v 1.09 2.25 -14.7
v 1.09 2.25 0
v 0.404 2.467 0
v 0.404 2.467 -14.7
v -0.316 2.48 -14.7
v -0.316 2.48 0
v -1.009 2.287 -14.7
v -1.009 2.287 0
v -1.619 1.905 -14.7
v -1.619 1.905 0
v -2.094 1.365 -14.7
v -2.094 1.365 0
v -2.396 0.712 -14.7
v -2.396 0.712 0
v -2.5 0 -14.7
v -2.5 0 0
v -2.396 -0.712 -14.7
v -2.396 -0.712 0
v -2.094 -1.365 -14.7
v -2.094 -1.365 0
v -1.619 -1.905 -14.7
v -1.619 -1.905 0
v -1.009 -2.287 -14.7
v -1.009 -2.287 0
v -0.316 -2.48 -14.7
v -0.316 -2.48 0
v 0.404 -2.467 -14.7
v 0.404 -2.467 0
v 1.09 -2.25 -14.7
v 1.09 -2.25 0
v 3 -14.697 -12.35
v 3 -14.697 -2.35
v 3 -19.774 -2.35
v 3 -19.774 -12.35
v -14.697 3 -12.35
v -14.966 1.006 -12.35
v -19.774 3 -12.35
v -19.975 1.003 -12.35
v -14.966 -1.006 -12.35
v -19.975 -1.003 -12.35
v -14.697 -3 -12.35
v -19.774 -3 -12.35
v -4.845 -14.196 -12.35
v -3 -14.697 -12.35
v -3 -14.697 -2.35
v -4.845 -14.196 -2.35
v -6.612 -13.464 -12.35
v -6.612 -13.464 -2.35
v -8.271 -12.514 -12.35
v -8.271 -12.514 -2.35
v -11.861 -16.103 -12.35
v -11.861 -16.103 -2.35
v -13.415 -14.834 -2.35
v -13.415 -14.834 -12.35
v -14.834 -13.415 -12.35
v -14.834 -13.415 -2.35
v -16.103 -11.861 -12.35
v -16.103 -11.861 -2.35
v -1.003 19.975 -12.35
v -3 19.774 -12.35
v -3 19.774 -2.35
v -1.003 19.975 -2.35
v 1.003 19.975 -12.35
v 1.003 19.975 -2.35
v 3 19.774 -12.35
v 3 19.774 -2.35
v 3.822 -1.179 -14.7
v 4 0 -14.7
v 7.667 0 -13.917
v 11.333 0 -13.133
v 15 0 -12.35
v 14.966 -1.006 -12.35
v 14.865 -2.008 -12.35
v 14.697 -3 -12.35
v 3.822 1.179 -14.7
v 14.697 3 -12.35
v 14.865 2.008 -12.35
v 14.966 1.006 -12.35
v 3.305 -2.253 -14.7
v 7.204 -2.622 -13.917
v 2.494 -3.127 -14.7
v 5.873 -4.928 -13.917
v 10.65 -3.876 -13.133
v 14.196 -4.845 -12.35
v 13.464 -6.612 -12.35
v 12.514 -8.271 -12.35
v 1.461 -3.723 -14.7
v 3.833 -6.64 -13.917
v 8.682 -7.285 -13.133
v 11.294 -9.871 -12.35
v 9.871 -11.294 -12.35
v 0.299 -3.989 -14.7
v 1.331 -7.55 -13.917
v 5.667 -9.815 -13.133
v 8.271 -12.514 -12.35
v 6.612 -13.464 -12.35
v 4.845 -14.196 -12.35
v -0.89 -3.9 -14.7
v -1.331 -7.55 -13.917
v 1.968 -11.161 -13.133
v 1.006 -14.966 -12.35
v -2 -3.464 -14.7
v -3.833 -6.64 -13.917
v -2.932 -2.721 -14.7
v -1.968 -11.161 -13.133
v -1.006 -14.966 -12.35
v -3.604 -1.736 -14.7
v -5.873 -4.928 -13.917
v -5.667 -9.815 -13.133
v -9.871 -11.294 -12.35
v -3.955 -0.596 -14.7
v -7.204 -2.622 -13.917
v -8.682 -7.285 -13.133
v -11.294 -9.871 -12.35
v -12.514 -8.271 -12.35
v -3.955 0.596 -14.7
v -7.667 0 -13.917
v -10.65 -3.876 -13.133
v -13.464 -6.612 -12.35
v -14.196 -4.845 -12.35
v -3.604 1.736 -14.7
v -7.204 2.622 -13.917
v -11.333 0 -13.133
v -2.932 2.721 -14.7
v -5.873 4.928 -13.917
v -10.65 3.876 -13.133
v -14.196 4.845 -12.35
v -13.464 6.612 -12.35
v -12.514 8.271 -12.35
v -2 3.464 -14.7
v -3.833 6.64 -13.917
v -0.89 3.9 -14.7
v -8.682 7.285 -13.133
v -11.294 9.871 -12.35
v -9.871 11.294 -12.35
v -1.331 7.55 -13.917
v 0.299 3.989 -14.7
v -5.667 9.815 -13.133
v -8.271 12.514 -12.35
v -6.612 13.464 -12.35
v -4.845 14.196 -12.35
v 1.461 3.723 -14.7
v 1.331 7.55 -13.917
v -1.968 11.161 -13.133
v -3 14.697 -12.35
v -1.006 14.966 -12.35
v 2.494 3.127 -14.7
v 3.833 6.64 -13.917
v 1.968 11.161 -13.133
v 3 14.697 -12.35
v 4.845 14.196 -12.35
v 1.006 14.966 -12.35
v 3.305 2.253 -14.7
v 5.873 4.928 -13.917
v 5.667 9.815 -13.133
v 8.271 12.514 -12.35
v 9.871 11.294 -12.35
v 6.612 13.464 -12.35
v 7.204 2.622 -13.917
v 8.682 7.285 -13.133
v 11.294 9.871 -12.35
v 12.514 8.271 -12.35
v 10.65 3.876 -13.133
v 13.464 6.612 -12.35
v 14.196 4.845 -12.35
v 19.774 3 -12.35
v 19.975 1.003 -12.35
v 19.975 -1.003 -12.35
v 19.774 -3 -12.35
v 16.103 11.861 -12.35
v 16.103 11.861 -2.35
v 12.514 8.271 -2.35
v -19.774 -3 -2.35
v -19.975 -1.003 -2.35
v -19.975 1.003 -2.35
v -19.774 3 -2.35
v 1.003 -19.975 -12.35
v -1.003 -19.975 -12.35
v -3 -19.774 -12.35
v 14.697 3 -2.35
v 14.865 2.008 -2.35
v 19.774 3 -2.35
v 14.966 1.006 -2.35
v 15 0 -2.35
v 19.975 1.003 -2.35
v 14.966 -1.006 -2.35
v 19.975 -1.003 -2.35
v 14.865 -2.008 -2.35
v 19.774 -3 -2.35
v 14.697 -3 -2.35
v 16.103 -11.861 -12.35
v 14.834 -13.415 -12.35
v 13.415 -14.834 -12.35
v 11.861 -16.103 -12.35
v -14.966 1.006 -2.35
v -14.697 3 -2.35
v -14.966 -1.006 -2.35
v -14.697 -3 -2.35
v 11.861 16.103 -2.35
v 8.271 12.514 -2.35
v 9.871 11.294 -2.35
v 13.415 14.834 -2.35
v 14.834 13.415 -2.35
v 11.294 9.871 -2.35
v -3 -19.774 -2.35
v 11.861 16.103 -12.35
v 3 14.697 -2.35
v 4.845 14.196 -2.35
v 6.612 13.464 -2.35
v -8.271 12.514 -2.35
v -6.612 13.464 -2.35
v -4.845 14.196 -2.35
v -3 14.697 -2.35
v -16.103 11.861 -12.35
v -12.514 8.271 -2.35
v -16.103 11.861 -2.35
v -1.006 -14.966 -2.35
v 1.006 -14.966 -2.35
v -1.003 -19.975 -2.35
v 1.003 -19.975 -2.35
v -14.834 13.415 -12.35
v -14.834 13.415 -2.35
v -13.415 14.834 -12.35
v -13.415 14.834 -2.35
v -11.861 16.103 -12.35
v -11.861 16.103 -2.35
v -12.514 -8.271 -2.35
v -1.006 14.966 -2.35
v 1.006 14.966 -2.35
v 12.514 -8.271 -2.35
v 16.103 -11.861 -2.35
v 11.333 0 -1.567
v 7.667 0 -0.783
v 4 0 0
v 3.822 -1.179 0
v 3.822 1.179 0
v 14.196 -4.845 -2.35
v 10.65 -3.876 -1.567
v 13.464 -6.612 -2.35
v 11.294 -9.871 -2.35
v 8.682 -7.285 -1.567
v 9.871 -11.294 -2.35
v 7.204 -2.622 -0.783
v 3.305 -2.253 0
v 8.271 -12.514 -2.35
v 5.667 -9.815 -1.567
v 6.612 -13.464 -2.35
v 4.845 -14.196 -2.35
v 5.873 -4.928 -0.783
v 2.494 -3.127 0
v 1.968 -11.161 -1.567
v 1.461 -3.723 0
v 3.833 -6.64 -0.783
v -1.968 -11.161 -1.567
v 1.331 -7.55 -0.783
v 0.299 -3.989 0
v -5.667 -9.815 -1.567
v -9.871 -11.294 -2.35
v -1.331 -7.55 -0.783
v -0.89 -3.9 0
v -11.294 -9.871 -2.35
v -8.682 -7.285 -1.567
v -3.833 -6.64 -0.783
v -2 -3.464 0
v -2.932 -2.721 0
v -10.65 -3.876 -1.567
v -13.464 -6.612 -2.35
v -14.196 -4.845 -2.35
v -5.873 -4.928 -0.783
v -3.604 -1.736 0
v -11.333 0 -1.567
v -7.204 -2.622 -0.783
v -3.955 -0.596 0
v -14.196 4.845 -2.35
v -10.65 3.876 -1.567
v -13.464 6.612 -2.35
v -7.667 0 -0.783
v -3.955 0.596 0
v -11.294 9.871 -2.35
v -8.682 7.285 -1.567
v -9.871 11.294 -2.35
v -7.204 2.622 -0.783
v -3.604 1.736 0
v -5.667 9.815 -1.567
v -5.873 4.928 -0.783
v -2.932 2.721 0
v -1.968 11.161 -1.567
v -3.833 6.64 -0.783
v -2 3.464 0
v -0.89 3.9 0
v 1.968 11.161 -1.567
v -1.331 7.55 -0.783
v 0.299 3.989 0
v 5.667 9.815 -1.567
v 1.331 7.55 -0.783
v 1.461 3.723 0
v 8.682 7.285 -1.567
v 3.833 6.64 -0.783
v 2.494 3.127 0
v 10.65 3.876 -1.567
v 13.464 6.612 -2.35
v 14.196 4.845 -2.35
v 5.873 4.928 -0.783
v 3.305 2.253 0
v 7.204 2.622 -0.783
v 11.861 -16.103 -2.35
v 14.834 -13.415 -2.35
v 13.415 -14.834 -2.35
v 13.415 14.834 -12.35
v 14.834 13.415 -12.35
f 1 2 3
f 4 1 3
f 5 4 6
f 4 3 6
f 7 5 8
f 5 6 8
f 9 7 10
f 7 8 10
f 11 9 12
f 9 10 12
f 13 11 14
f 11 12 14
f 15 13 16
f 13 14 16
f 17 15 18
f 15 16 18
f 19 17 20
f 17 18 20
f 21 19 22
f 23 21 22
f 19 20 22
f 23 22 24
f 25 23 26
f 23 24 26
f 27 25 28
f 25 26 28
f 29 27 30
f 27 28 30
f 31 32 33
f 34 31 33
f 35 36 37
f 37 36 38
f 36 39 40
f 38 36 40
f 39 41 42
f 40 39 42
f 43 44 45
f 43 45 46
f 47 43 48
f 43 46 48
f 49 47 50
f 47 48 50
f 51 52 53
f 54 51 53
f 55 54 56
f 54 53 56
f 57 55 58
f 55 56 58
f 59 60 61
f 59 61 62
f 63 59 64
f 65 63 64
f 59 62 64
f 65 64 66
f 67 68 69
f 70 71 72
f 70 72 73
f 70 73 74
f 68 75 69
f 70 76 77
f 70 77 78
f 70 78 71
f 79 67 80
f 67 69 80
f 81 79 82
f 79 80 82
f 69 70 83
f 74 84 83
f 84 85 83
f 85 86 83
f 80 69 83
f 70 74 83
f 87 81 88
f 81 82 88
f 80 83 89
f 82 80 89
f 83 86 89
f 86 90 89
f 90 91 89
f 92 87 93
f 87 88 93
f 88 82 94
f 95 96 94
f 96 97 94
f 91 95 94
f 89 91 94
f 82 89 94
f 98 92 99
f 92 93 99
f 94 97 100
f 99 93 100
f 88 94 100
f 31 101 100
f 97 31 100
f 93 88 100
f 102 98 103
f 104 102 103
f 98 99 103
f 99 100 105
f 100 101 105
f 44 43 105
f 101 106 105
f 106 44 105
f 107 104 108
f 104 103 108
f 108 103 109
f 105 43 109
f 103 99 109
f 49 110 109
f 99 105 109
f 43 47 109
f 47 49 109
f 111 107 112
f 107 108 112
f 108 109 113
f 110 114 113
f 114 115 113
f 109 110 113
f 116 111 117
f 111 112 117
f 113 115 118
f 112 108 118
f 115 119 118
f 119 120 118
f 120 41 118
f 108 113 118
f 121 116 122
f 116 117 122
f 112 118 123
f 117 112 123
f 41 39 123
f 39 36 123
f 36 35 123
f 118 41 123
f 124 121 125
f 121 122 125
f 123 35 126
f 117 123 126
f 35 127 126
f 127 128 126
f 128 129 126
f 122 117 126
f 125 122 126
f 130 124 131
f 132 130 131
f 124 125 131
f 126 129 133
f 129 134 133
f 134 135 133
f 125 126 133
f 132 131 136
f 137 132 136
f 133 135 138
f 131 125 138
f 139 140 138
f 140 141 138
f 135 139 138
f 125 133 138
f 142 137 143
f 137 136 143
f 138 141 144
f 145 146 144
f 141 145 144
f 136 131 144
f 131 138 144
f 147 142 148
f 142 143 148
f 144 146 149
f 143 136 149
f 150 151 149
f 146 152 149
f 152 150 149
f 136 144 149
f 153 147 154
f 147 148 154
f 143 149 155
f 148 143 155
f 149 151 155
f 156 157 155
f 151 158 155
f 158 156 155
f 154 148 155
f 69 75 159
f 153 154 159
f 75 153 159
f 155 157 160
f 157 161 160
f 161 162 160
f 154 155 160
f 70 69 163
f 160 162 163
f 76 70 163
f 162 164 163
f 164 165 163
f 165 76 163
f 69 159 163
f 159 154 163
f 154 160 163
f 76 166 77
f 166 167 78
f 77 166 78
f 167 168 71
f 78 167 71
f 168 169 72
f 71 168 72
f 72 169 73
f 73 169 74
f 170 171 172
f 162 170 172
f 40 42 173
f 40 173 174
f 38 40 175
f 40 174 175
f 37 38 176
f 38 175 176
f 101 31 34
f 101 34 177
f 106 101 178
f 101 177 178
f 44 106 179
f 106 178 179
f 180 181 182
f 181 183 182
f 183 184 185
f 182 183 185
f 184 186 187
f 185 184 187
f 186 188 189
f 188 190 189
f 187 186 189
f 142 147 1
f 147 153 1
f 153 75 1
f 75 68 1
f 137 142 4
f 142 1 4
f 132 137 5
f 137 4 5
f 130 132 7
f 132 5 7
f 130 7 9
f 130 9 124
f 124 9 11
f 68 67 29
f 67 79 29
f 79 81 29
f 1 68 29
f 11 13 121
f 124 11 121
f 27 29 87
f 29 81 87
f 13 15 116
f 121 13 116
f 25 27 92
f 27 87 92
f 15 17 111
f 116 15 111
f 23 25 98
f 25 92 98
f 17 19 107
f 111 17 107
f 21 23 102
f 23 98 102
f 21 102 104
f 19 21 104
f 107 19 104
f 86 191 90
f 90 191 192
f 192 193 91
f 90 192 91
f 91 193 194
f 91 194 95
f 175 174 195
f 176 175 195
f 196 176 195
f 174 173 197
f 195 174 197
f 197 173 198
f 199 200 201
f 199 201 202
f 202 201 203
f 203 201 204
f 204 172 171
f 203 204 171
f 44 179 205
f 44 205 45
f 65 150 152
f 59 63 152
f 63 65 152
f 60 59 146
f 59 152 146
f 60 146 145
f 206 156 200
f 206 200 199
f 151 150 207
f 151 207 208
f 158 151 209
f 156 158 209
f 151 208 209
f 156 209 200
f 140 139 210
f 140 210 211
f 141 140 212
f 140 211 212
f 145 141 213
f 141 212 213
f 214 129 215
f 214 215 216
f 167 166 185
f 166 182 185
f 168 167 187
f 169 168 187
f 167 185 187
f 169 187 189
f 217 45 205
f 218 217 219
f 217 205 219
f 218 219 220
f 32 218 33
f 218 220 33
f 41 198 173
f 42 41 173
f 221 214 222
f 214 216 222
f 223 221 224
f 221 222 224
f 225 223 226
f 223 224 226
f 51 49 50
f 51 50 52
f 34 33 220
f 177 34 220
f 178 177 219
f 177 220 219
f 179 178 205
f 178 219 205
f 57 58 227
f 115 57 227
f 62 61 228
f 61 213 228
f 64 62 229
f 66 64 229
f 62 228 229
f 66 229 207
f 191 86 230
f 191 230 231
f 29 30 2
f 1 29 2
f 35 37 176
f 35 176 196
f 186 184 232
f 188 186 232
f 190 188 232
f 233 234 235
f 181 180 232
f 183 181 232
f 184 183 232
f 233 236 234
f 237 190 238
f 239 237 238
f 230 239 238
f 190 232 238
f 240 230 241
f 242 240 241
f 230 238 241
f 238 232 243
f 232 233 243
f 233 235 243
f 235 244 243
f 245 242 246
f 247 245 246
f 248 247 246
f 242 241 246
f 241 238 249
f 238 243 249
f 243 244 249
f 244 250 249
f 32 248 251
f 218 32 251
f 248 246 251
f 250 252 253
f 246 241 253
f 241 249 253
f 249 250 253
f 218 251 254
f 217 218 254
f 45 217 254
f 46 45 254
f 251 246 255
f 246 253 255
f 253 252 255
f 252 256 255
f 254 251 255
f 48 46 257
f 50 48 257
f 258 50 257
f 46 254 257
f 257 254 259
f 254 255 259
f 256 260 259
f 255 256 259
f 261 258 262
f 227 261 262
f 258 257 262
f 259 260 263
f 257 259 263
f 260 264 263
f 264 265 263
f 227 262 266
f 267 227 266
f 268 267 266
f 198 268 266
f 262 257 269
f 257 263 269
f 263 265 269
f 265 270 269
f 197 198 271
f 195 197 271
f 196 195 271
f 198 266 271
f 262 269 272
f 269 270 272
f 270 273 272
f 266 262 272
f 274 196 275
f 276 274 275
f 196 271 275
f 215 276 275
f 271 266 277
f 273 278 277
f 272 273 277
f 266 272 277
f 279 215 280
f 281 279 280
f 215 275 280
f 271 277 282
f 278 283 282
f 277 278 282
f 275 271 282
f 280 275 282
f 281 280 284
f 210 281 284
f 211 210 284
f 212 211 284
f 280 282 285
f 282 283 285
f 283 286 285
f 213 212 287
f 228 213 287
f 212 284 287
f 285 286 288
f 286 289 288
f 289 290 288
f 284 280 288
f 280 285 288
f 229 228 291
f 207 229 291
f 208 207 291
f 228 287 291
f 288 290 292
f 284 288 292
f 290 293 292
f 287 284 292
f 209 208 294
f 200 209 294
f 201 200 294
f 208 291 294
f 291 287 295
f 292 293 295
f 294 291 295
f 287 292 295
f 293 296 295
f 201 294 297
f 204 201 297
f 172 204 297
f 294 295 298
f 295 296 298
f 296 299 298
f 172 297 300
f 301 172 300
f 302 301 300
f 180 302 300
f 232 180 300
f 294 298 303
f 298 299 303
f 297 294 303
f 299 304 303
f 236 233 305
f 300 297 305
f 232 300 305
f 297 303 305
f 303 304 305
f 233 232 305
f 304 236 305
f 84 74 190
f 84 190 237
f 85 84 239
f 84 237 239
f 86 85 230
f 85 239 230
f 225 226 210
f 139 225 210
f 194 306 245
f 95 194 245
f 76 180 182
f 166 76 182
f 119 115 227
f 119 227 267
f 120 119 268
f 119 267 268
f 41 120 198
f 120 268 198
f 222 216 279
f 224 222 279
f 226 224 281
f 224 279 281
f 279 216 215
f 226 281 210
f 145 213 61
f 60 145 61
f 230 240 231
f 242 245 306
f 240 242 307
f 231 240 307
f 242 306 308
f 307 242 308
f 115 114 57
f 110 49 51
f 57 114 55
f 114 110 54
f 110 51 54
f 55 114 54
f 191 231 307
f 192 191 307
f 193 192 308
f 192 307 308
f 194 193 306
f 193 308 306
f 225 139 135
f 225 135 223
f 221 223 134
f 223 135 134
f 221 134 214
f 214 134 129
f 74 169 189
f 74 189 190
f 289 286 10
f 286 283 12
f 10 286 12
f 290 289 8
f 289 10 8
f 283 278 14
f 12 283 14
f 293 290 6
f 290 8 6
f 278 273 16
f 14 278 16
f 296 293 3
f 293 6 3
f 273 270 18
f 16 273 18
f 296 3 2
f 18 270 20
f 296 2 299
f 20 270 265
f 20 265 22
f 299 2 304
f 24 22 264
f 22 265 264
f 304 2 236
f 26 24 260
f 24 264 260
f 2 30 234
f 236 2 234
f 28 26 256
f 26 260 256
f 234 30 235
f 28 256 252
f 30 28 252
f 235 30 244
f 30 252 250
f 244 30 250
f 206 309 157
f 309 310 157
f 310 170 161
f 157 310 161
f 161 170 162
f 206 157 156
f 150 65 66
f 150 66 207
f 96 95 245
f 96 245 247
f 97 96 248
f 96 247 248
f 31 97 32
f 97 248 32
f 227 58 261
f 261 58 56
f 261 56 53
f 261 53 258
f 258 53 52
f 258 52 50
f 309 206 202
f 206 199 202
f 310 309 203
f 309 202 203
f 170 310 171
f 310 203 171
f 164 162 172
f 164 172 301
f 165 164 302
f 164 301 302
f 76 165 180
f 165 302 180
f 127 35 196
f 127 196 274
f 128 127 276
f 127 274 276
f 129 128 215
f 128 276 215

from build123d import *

# Parameters (mm, degrees)
SKETCH2_R          = 25
SKETCH2_R_2        = 20
CUT_EXTRUDE5_DEPTH = 30
CUT_EXTRUDE6_DEPTH = 20


with BuildPart() as part:
    # Sketch3 → Revolve3 (revolve)
    with BuildSketch(Plane(origin=(0, 0, 0), x_dir=(0, 0, -1), z_dir=(1, 0, 0)), mode=Mode.PRIVATE) as revolve3_sk:
        Polygon((0, 0), (14.7, 0), (14.7, 4), (12.35, 15), (12.35, 20), (2.35, 20), (2.35, 15), (0, 4), align=None)
    revolve(revolve3_sk.sketch.rotate(Axis((0, 0, 0), (0, 0, -1)), 90), axis=Axis((0, 0, 0), (0, 0, -1)))

    # Sketch2 → Cut-Extrude5 (cut)
    with BuildSketch(Plane.XY):
        Circle(SKETCH2_R)
        Circle(SKETCH2_R_2, mode=Mode.SUBTRACT)
        with BuildLine():
            ThreePointArc((-12.513625189, -8.270984502), (-13.858192988, -5.740251485), (-14.696938457, -3))
            Line((-14.696938457, -3), (-19.773719933, -3))
            ThreePointArc((-19.773719933, -3), (-18.47759065, -7.653668647), (-16.103451798, -11.860811111))
            Line((-16.103451798, -11.860811111), (-12.513625189, -8.270984502))
        make_face()
        with BuildLine():
            ThreePointArc((-14.696938457, 3), (-13.858192988, 5.740251485), (-12.513625189, 8.270984502))
            Line((-12.513625189, 8.270984502), (-16.103451798, 11.860811111))
            ThreePointArc((-16.103451798, 11.860811111), (-18.47759065, 7.653668647), (-19.773719933, 3))
            Line((-19.773719933, 3), (-14.696938457, 3))
        make_face()
        with BuildLine():
            ThreePointArc((-8.270984502, 12.513625189), (-5.740251485, 13.858192988), (-3, 14.696938457))
            Line((-3, 14.696938457), (-3, 19.773719933))
            ThreePointArc((-3, 19.773719933), (-7.653668647, 18.47759065), (-11.860811111, 16.103451798))
            Line((-11.860811111, 16.103451798), (-8.270984502, 12.513625189))
        make_face()
        with BuildLine():
            Line((3, 19.773719933), (3, 14.696938457))
            ThreePointArc((3, 14.696938457), (5.740251485, 13.858192988), (8.270984502, 12.513625189))
            Line((8.270984502, 12.513625189), (11.860811111, 16.103451798))
            ThreePointArc((11.860811111, 16.103451798), (7.653668647, 18.47759065), (3, 19.773719933))
        make_face()
        with BuildLine():
            Line((16.103451798, 11.860811111), (12.513625189, 8.270984502))
            ThreePointArc((12.513625189, 8.270984502), (13.858192988, 5.740251485), (14.696938457, 3))
            Line((14.696938457, 3), (19.773719933, 3))
            ThreePointArc((19.773719933, 3), (18.47759065, 7.653668647), (16.103451798, 11.860811111))
        make_face()
        with BuildLine():
            ThreePointArc((16.103451798, -11.860811111), (18.47759065, -7.653668647), (19.773719933, -3))
            Line((19.773719933, -3), (14.696938457, -3))
            ThreePointArc((14.696938457, -3), (13.858192988, -5.740251485), (12.513625189, -8.270984502))
            Line((12.513625189, -8.270984502), (16.103451798, -11.860811111))
        make_face()
        with BuildLine():
            ThreePointArc((3, -19.773719933), (7.653668647, -18.47759065), (11.860811111, -16.103451798))
            Line((11.860811111, -16.103451798), (8.270984502, -12.513625189))
            ThreePointArc((8.270984502, -12.513625189), (5.740251485, -13.858192988), (3, -14.696938457))
            Line((3, -14.696938457), (3, -19.773719933))
        make_face()
        with BuildLine():
            ThreePointArc((-3, -14.696938457), (-5.740251485, -13.858192988), (-8.270984502, -12.513625189))
            Line((-8.270984502, -12.513625189), (-11.860811111, -16.103451798))
            ThreePointArc((-11.860811111, -16.103451798), (-7.653668647, -18.47759065), (-3, -19.773719933))
            Line((-3, -19.773719933), (-3, -14.696938457))
        make_face()
    extrude(amount=-CUT_EXTRUDE5_DEPTH, mode=Mode.SUBTRACT)

    # Sketch4 → Cut-Extrude6 (cut)
    with BuildSketch(Plane.XY):
        with BuildLine():
            Line((1.089724736, -2.25), (1.089724736, 2.25))
            ThreePointArc((1.089724736, 2.25), (-2.5, 0), (1.089724736, -2.25))
        make_face()
    extrude(amount=-CUT_EXTRUDE6_DEPTH, mode=Mode.SUBTRACT)


solid = part.part
